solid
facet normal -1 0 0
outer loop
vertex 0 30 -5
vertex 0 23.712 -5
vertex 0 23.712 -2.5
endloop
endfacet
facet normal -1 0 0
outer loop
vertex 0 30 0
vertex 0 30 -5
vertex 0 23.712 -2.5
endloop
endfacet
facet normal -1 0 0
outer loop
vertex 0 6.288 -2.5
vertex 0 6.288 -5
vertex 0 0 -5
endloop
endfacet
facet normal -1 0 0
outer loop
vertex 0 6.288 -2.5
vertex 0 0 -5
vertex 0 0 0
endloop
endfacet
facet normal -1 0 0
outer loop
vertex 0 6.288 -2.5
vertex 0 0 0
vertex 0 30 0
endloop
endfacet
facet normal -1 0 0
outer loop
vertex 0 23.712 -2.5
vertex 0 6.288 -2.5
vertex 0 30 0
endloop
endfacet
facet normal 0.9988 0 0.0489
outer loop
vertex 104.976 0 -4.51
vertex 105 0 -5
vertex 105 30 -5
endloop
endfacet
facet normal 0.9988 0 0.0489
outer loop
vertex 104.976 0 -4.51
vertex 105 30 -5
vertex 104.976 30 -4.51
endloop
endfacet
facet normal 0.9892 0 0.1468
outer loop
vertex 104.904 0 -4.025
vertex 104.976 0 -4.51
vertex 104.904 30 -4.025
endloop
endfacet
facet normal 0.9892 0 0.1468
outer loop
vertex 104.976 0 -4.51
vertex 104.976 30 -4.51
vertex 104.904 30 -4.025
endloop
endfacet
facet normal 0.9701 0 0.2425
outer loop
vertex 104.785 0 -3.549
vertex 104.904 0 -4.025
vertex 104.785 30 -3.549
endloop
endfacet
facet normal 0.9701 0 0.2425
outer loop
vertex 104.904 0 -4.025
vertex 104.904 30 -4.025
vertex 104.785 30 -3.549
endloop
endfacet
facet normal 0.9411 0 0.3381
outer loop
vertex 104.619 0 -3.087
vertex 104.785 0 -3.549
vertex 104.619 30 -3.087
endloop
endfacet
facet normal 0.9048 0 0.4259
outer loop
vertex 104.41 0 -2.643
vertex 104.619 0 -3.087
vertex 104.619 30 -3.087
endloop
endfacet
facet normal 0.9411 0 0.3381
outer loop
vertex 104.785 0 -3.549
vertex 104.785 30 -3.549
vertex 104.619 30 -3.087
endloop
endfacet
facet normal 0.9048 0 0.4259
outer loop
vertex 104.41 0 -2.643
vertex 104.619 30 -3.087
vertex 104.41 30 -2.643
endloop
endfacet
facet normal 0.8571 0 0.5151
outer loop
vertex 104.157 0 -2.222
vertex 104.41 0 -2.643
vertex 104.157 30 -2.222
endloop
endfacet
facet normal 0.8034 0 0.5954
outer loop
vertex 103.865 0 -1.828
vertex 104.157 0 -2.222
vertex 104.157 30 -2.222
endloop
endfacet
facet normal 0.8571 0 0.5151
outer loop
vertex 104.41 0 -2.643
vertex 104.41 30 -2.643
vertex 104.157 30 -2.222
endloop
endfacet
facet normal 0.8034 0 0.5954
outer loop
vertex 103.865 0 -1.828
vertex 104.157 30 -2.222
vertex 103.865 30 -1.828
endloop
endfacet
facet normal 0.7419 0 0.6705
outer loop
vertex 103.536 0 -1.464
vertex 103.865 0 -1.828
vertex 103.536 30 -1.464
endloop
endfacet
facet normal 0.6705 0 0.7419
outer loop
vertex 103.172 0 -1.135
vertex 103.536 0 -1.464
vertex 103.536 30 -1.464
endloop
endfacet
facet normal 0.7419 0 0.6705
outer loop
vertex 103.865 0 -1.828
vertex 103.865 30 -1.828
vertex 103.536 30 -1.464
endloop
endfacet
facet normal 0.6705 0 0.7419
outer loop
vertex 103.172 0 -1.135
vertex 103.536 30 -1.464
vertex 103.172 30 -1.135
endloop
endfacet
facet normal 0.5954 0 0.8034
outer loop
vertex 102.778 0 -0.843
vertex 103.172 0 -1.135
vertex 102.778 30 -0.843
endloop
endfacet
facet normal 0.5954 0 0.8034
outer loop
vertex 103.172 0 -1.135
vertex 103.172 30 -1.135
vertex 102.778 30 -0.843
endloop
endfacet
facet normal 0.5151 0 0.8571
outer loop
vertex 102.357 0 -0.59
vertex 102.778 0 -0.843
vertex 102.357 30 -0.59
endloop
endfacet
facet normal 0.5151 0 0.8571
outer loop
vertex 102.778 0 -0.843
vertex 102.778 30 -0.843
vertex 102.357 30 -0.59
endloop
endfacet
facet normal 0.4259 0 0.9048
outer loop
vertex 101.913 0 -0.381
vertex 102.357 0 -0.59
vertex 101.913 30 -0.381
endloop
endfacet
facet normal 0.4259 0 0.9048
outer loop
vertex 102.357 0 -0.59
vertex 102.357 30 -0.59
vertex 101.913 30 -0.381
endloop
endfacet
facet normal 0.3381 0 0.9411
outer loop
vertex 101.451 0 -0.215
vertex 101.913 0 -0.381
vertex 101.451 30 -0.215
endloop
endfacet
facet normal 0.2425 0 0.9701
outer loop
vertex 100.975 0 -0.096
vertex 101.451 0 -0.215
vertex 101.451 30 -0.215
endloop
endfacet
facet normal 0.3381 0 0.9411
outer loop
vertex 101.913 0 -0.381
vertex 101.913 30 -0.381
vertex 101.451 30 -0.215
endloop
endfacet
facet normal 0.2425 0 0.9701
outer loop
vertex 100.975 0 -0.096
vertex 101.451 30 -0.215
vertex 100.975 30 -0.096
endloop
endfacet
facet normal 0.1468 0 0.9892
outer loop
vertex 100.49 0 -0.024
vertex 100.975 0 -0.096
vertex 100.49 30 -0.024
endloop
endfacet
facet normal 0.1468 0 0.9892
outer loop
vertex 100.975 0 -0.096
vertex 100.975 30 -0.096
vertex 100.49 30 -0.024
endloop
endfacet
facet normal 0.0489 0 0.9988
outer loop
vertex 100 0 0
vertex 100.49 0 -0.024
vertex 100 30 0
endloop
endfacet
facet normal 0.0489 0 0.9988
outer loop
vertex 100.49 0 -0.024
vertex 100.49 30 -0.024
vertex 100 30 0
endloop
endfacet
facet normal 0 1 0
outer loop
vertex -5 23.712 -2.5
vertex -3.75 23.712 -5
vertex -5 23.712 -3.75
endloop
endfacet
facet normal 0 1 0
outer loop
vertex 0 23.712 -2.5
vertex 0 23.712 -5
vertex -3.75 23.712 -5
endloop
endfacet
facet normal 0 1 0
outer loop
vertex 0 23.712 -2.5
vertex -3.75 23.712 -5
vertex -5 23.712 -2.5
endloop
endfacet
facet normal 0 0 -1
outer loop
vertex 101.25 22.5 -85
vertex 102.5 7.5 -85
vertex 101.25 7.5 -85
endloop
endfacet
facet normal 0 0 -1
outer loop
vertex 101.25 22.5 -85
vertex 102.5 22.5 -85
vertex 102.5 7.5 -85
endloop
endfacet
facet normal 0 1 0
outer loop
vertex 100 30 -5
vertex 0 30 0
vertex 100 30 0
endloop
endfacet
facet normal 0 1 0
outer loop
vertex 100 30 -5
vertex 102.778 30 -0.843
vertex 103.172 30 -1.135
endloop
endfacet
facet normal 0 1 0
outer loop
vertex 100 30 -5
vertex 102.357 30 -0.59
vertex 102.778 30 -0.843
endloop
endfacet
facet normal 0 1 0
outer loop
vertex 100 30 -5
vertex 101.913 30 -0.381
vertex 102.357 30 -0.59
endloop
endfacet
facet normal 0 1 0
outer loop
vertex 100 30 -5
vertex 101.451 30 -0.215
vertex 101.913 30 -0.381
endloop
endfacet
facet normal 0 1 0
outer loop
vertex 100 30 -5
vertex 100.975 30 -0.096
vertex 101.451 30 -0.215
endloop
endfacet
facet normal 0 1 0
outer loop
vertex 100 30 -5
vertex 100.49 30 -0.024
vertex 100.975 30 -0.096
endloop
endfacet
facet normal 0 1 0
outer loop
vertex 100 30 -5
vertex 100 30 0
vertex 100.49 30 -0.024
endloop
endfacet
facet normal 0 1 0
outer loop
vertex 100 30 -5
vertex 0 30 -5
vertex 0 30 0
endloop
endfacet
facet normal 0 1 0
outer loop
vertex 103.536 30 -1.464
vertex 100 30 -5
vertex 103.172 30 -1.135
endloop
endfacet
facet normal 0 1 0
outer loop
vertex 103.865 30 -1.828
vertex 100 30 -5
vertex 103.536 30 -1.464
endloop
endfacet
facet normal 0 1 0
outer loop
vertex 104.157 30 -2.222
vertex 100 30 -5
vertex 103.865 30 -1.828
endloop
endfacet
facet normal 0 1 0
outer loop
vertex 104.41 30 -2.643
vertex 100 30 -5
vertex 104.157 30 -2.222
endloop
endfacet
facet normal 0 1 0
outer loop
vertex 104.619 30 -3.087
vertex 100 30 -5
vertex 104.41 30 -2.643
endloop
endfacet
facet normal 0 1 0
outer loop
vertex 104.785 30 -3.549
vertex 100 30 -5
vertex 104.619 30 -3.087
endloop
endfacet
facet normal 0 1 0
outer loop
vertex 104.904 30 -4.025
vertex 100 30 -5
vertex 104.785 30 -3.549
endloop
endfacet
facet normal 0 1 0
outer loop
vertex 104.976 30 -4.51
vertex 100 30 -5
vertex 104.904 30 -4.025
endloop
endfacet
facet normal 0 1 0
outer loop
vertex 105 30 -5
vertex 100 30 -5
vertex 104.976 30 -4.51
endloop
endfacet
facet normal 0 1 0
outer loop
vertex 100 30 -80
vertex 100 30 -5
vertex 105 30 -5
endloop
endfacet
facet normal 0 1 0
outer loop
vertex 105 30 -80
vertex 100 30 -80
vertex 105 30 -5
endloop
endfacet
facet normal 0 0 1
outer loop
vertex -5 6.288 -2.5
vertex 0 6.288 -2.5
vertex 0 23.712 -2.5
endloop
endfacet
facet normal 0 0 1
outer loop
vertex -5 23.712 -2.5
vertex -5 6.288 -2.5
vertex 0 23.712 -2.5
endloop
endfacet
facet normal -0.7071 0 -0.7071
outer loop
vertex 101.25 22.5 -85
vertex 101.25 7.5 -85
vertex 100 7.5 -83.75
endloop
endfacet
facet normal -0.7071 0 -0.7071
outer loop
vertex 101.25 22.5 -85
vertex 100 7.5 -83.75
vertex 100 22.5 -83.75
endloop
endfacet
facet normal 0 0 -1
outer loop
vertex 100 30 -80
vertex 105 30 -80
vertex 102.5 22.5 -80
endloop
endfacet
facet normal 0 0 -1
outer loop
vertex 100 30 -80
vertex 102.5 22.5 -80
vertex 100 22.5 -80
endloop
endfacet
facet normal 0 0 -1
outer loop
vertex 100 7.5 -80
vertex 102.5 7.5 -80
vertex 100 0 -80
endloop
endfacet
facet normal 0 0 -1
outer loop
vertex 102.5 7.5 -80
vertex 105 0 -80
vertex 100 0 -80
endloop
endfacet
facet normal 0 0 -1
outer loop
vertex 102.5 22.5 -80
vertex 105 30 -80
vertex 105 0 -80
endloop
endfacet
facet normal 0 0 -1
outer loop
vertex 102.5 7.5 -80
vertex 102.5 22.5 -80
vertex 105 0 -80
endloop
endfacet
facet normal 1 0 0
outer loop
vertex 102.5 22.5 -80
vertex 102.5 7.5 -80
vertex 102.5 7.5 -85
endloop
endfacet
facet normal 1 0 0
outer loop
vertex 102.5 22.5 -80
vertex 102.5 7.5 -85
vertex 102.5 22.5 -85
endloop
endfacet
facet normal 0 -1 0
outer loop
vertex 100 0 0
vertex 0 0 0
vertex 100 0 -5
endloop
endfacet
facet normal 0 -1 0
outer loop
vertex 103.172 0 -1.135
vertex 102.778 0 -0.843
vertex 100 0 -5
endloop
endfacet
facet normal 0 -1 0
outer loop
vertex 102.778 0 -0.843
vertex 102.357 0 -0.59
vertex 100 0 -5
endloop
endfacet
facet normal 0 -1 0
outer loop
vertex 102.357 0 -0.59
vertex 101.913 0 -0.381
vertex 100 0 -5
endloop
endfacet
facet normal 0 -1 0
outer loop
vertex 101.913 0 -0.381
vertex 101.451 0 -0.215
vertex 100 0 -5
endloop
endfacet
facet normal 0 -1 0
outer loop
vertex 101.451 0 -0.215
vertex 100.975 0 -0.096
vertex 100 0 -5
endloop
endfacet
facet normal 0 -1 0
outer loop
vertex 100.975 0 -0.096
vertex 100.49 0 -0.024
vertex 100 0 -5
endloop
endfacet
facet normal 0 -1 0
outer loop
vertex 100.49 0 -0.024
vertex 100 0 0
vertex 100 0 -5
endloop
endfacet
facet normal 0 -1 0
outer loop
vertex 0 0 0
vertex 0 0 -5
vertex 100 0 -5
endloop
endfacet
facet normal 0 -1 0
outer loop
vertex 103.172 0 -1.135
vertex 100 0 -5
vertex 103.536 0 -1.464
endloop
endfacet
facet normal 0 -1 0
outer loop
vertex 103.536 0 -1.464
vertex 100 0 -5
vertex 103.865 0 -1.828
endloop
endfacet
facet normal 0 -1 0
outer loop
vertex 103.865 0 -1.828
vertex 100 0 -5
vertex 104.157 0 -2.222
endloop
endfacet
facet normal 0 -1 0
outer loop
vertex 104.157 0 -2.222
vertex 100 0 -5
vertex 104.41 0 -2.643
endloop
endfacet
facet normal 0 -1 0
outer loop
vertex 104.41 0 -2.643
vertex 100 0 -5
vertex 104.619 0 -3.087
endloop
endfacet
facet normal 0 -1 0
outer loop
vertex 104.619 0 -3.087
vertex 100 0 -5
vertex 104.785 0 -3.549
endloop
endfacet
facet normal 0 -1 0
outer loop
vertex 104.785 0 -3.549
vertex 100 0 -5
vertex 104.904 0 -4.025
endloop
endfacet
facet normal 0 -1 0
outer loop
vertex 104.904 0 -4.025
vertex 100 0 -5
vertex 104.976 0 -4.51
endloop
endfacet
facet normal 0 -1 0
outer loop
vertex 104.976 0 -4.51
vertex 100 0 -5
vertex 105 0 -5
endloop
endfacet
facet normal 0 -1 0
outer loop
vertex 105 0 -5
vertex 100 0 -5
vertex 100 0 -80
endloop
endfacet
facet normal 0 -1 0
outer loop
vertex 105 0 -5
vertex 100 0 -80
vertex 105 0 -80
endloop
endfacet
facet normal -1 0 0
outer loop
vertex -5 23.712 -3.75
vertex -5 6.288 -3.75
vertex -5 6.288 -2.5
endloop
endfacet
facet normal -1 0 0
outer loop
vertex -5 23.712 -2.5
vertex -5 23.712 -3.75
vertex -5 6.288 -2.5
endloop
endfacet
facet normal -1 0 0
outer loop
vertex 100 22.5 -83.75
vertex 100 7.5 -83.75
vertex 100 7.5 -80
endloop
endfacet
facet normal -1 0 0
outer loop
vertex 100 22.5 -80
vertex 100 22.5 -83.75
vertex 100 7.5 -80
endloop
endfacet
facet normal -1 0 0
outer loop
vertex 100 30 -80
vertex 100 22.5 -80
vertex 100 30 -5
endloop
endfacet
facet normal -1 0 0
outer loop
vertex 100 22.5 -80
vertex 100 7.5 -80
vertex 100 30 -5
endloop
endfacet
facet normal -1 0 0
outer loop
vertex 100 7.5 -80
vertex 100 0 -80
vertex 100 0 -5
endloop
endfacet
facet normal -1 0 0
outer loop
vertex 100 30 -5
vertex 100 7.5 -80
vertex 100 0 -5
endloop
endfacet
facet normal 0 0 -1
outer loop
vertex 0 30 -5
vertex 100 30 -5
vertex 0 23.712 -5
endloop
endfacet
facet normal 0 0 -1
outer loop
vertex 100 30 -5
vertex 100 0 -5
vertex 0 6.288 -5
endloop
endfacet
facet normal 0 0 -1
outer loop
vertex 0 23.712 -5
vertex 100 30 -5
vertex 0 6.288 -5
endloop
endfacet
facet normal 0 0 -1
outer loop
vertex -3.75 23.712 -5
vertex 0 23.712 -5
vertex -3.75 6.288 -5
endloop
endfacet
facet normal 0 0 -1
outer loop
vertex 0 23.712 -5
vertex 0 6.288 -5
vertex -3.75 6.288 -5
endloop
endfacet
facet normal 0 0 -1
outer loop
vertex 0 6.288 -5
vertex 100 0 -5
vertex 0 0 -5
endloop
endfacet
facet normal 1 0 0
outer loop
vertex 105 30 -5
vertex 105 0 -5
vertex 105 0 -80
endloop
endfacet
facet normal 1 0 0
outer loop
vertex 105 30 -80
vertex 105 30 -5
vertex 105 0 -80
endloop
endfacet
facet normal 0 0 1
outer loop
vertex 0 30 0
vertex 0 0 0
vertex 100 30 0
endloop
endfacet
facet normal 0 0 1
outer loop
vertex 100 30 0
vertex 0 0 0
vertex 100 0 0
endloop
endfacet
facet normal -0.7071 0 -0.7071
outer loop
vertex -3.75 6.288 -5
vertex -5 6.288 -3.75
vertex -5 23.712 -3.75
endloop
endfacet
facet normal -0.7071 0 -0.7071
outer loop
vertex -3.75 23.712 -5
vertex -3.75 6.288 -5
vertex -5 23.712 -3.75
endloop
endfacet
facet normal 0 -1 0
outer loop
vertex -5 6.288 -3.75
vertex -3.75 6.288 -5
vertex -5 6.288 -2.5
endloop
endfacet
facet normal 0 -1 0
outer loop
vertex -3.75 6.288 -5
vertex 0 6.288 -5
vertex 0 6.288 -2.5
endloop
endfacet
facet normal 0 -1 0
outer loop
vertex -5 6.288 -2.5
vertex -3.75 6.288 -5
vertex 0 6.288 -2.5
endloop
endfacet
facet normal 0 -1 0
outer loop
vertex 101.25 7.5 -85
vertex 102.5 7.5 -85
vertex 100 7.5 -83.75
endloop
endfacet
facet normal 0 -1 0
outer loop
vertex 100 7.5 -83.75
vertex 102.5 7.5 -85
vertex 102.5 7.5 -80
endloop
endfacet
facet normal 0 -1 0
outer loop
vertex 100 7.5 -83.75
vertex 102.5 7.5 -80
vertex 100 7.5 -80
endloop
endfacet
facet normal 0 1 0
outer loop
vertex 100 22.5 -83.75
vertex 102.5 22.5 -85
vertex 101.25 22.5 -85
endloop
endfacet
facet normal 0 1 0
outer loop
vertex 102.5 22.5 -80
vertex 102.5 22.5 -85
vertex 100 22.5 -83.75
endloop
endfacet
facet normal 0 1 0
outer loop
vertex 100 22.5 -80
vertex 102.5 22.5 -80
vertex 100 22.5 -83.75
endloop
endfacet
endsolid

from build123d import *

# Parameters (mm, degrees)
BOSS_EXTRUDE1_DEPTH = 30
SKETCH2_W           = 2.5
SKETCH2_H           = 17.424704808
BOSS_EXTRUDE2_DEPTH = 5
CHAMFER1_SIZE       = 1.25
SKETCH3_W           = 2.5
SKETCH3_H           = 15
BOSS_EXTRUDE3_DEPTH = 5
CHAMFER2_SIZE       = 1.25
FILLET1_R           = 5


with BuildPart() as part:
    # Sketch1 → Boss-Extrude1 (new body)
    with BuildSketch(Plane(origin=(0, 0, 0), x_dir=(1, 0, 0), z_dir=(0, 1, 0))):
        Polygon((0, 0), (105, 0), (105, 80), (100, 80), (100, 5), (0, 5), align=None)
    extrude(amount=BOSS_EXTRUDE1_DEPTH)

    # Sketch2 → Boss-Extrude2 (add)
    with BuildSketch(Plane.ZY):
        with Locations((-3.75, 15)):
            Rectangle(SKETCH2_W, SKETCH2_H)
    extrude(amount=BOSS_EXTRUDE2_DEPTH)

    # Chamfer1
    chamfer1_edges = [part.edges().sort_by_distance(p)[0] for p in [
        (-5, 15, -5),
    ]]
    chamfer(chamfer1_edges, length=CHAMFER1_SIZE)

    # Sketch3 → Boss-Extrude3 (add)
    with BuildSketch(Plane(origin=(0, 0, -80), x_dir=(-1, 0, 0), z_dir=(0, 0, -1))):
        with Locations((-101.25, 15)):
            Rectangle(SKETCH3_W, SKETCH3_H)
    extrude(amount=BOSS_EXTRUDE3_DEPTH)

    # Chamfer2
    chamfer2_edges = [part.edges().sort_by_distance(p)[0] for p in [
        (100, 15, -85),
    ]]
    chamfer(chamfer2_edges, length=CHAMFER2_SIZE)

    # Fillet1
    fillet1_edges = [part.edges().sort_by_distance(p)[0] for p in [
        (105, 15, 0),
    ]]
    fillet(fillet1_edges, radius=FILLET1_R)


solid = part.part
